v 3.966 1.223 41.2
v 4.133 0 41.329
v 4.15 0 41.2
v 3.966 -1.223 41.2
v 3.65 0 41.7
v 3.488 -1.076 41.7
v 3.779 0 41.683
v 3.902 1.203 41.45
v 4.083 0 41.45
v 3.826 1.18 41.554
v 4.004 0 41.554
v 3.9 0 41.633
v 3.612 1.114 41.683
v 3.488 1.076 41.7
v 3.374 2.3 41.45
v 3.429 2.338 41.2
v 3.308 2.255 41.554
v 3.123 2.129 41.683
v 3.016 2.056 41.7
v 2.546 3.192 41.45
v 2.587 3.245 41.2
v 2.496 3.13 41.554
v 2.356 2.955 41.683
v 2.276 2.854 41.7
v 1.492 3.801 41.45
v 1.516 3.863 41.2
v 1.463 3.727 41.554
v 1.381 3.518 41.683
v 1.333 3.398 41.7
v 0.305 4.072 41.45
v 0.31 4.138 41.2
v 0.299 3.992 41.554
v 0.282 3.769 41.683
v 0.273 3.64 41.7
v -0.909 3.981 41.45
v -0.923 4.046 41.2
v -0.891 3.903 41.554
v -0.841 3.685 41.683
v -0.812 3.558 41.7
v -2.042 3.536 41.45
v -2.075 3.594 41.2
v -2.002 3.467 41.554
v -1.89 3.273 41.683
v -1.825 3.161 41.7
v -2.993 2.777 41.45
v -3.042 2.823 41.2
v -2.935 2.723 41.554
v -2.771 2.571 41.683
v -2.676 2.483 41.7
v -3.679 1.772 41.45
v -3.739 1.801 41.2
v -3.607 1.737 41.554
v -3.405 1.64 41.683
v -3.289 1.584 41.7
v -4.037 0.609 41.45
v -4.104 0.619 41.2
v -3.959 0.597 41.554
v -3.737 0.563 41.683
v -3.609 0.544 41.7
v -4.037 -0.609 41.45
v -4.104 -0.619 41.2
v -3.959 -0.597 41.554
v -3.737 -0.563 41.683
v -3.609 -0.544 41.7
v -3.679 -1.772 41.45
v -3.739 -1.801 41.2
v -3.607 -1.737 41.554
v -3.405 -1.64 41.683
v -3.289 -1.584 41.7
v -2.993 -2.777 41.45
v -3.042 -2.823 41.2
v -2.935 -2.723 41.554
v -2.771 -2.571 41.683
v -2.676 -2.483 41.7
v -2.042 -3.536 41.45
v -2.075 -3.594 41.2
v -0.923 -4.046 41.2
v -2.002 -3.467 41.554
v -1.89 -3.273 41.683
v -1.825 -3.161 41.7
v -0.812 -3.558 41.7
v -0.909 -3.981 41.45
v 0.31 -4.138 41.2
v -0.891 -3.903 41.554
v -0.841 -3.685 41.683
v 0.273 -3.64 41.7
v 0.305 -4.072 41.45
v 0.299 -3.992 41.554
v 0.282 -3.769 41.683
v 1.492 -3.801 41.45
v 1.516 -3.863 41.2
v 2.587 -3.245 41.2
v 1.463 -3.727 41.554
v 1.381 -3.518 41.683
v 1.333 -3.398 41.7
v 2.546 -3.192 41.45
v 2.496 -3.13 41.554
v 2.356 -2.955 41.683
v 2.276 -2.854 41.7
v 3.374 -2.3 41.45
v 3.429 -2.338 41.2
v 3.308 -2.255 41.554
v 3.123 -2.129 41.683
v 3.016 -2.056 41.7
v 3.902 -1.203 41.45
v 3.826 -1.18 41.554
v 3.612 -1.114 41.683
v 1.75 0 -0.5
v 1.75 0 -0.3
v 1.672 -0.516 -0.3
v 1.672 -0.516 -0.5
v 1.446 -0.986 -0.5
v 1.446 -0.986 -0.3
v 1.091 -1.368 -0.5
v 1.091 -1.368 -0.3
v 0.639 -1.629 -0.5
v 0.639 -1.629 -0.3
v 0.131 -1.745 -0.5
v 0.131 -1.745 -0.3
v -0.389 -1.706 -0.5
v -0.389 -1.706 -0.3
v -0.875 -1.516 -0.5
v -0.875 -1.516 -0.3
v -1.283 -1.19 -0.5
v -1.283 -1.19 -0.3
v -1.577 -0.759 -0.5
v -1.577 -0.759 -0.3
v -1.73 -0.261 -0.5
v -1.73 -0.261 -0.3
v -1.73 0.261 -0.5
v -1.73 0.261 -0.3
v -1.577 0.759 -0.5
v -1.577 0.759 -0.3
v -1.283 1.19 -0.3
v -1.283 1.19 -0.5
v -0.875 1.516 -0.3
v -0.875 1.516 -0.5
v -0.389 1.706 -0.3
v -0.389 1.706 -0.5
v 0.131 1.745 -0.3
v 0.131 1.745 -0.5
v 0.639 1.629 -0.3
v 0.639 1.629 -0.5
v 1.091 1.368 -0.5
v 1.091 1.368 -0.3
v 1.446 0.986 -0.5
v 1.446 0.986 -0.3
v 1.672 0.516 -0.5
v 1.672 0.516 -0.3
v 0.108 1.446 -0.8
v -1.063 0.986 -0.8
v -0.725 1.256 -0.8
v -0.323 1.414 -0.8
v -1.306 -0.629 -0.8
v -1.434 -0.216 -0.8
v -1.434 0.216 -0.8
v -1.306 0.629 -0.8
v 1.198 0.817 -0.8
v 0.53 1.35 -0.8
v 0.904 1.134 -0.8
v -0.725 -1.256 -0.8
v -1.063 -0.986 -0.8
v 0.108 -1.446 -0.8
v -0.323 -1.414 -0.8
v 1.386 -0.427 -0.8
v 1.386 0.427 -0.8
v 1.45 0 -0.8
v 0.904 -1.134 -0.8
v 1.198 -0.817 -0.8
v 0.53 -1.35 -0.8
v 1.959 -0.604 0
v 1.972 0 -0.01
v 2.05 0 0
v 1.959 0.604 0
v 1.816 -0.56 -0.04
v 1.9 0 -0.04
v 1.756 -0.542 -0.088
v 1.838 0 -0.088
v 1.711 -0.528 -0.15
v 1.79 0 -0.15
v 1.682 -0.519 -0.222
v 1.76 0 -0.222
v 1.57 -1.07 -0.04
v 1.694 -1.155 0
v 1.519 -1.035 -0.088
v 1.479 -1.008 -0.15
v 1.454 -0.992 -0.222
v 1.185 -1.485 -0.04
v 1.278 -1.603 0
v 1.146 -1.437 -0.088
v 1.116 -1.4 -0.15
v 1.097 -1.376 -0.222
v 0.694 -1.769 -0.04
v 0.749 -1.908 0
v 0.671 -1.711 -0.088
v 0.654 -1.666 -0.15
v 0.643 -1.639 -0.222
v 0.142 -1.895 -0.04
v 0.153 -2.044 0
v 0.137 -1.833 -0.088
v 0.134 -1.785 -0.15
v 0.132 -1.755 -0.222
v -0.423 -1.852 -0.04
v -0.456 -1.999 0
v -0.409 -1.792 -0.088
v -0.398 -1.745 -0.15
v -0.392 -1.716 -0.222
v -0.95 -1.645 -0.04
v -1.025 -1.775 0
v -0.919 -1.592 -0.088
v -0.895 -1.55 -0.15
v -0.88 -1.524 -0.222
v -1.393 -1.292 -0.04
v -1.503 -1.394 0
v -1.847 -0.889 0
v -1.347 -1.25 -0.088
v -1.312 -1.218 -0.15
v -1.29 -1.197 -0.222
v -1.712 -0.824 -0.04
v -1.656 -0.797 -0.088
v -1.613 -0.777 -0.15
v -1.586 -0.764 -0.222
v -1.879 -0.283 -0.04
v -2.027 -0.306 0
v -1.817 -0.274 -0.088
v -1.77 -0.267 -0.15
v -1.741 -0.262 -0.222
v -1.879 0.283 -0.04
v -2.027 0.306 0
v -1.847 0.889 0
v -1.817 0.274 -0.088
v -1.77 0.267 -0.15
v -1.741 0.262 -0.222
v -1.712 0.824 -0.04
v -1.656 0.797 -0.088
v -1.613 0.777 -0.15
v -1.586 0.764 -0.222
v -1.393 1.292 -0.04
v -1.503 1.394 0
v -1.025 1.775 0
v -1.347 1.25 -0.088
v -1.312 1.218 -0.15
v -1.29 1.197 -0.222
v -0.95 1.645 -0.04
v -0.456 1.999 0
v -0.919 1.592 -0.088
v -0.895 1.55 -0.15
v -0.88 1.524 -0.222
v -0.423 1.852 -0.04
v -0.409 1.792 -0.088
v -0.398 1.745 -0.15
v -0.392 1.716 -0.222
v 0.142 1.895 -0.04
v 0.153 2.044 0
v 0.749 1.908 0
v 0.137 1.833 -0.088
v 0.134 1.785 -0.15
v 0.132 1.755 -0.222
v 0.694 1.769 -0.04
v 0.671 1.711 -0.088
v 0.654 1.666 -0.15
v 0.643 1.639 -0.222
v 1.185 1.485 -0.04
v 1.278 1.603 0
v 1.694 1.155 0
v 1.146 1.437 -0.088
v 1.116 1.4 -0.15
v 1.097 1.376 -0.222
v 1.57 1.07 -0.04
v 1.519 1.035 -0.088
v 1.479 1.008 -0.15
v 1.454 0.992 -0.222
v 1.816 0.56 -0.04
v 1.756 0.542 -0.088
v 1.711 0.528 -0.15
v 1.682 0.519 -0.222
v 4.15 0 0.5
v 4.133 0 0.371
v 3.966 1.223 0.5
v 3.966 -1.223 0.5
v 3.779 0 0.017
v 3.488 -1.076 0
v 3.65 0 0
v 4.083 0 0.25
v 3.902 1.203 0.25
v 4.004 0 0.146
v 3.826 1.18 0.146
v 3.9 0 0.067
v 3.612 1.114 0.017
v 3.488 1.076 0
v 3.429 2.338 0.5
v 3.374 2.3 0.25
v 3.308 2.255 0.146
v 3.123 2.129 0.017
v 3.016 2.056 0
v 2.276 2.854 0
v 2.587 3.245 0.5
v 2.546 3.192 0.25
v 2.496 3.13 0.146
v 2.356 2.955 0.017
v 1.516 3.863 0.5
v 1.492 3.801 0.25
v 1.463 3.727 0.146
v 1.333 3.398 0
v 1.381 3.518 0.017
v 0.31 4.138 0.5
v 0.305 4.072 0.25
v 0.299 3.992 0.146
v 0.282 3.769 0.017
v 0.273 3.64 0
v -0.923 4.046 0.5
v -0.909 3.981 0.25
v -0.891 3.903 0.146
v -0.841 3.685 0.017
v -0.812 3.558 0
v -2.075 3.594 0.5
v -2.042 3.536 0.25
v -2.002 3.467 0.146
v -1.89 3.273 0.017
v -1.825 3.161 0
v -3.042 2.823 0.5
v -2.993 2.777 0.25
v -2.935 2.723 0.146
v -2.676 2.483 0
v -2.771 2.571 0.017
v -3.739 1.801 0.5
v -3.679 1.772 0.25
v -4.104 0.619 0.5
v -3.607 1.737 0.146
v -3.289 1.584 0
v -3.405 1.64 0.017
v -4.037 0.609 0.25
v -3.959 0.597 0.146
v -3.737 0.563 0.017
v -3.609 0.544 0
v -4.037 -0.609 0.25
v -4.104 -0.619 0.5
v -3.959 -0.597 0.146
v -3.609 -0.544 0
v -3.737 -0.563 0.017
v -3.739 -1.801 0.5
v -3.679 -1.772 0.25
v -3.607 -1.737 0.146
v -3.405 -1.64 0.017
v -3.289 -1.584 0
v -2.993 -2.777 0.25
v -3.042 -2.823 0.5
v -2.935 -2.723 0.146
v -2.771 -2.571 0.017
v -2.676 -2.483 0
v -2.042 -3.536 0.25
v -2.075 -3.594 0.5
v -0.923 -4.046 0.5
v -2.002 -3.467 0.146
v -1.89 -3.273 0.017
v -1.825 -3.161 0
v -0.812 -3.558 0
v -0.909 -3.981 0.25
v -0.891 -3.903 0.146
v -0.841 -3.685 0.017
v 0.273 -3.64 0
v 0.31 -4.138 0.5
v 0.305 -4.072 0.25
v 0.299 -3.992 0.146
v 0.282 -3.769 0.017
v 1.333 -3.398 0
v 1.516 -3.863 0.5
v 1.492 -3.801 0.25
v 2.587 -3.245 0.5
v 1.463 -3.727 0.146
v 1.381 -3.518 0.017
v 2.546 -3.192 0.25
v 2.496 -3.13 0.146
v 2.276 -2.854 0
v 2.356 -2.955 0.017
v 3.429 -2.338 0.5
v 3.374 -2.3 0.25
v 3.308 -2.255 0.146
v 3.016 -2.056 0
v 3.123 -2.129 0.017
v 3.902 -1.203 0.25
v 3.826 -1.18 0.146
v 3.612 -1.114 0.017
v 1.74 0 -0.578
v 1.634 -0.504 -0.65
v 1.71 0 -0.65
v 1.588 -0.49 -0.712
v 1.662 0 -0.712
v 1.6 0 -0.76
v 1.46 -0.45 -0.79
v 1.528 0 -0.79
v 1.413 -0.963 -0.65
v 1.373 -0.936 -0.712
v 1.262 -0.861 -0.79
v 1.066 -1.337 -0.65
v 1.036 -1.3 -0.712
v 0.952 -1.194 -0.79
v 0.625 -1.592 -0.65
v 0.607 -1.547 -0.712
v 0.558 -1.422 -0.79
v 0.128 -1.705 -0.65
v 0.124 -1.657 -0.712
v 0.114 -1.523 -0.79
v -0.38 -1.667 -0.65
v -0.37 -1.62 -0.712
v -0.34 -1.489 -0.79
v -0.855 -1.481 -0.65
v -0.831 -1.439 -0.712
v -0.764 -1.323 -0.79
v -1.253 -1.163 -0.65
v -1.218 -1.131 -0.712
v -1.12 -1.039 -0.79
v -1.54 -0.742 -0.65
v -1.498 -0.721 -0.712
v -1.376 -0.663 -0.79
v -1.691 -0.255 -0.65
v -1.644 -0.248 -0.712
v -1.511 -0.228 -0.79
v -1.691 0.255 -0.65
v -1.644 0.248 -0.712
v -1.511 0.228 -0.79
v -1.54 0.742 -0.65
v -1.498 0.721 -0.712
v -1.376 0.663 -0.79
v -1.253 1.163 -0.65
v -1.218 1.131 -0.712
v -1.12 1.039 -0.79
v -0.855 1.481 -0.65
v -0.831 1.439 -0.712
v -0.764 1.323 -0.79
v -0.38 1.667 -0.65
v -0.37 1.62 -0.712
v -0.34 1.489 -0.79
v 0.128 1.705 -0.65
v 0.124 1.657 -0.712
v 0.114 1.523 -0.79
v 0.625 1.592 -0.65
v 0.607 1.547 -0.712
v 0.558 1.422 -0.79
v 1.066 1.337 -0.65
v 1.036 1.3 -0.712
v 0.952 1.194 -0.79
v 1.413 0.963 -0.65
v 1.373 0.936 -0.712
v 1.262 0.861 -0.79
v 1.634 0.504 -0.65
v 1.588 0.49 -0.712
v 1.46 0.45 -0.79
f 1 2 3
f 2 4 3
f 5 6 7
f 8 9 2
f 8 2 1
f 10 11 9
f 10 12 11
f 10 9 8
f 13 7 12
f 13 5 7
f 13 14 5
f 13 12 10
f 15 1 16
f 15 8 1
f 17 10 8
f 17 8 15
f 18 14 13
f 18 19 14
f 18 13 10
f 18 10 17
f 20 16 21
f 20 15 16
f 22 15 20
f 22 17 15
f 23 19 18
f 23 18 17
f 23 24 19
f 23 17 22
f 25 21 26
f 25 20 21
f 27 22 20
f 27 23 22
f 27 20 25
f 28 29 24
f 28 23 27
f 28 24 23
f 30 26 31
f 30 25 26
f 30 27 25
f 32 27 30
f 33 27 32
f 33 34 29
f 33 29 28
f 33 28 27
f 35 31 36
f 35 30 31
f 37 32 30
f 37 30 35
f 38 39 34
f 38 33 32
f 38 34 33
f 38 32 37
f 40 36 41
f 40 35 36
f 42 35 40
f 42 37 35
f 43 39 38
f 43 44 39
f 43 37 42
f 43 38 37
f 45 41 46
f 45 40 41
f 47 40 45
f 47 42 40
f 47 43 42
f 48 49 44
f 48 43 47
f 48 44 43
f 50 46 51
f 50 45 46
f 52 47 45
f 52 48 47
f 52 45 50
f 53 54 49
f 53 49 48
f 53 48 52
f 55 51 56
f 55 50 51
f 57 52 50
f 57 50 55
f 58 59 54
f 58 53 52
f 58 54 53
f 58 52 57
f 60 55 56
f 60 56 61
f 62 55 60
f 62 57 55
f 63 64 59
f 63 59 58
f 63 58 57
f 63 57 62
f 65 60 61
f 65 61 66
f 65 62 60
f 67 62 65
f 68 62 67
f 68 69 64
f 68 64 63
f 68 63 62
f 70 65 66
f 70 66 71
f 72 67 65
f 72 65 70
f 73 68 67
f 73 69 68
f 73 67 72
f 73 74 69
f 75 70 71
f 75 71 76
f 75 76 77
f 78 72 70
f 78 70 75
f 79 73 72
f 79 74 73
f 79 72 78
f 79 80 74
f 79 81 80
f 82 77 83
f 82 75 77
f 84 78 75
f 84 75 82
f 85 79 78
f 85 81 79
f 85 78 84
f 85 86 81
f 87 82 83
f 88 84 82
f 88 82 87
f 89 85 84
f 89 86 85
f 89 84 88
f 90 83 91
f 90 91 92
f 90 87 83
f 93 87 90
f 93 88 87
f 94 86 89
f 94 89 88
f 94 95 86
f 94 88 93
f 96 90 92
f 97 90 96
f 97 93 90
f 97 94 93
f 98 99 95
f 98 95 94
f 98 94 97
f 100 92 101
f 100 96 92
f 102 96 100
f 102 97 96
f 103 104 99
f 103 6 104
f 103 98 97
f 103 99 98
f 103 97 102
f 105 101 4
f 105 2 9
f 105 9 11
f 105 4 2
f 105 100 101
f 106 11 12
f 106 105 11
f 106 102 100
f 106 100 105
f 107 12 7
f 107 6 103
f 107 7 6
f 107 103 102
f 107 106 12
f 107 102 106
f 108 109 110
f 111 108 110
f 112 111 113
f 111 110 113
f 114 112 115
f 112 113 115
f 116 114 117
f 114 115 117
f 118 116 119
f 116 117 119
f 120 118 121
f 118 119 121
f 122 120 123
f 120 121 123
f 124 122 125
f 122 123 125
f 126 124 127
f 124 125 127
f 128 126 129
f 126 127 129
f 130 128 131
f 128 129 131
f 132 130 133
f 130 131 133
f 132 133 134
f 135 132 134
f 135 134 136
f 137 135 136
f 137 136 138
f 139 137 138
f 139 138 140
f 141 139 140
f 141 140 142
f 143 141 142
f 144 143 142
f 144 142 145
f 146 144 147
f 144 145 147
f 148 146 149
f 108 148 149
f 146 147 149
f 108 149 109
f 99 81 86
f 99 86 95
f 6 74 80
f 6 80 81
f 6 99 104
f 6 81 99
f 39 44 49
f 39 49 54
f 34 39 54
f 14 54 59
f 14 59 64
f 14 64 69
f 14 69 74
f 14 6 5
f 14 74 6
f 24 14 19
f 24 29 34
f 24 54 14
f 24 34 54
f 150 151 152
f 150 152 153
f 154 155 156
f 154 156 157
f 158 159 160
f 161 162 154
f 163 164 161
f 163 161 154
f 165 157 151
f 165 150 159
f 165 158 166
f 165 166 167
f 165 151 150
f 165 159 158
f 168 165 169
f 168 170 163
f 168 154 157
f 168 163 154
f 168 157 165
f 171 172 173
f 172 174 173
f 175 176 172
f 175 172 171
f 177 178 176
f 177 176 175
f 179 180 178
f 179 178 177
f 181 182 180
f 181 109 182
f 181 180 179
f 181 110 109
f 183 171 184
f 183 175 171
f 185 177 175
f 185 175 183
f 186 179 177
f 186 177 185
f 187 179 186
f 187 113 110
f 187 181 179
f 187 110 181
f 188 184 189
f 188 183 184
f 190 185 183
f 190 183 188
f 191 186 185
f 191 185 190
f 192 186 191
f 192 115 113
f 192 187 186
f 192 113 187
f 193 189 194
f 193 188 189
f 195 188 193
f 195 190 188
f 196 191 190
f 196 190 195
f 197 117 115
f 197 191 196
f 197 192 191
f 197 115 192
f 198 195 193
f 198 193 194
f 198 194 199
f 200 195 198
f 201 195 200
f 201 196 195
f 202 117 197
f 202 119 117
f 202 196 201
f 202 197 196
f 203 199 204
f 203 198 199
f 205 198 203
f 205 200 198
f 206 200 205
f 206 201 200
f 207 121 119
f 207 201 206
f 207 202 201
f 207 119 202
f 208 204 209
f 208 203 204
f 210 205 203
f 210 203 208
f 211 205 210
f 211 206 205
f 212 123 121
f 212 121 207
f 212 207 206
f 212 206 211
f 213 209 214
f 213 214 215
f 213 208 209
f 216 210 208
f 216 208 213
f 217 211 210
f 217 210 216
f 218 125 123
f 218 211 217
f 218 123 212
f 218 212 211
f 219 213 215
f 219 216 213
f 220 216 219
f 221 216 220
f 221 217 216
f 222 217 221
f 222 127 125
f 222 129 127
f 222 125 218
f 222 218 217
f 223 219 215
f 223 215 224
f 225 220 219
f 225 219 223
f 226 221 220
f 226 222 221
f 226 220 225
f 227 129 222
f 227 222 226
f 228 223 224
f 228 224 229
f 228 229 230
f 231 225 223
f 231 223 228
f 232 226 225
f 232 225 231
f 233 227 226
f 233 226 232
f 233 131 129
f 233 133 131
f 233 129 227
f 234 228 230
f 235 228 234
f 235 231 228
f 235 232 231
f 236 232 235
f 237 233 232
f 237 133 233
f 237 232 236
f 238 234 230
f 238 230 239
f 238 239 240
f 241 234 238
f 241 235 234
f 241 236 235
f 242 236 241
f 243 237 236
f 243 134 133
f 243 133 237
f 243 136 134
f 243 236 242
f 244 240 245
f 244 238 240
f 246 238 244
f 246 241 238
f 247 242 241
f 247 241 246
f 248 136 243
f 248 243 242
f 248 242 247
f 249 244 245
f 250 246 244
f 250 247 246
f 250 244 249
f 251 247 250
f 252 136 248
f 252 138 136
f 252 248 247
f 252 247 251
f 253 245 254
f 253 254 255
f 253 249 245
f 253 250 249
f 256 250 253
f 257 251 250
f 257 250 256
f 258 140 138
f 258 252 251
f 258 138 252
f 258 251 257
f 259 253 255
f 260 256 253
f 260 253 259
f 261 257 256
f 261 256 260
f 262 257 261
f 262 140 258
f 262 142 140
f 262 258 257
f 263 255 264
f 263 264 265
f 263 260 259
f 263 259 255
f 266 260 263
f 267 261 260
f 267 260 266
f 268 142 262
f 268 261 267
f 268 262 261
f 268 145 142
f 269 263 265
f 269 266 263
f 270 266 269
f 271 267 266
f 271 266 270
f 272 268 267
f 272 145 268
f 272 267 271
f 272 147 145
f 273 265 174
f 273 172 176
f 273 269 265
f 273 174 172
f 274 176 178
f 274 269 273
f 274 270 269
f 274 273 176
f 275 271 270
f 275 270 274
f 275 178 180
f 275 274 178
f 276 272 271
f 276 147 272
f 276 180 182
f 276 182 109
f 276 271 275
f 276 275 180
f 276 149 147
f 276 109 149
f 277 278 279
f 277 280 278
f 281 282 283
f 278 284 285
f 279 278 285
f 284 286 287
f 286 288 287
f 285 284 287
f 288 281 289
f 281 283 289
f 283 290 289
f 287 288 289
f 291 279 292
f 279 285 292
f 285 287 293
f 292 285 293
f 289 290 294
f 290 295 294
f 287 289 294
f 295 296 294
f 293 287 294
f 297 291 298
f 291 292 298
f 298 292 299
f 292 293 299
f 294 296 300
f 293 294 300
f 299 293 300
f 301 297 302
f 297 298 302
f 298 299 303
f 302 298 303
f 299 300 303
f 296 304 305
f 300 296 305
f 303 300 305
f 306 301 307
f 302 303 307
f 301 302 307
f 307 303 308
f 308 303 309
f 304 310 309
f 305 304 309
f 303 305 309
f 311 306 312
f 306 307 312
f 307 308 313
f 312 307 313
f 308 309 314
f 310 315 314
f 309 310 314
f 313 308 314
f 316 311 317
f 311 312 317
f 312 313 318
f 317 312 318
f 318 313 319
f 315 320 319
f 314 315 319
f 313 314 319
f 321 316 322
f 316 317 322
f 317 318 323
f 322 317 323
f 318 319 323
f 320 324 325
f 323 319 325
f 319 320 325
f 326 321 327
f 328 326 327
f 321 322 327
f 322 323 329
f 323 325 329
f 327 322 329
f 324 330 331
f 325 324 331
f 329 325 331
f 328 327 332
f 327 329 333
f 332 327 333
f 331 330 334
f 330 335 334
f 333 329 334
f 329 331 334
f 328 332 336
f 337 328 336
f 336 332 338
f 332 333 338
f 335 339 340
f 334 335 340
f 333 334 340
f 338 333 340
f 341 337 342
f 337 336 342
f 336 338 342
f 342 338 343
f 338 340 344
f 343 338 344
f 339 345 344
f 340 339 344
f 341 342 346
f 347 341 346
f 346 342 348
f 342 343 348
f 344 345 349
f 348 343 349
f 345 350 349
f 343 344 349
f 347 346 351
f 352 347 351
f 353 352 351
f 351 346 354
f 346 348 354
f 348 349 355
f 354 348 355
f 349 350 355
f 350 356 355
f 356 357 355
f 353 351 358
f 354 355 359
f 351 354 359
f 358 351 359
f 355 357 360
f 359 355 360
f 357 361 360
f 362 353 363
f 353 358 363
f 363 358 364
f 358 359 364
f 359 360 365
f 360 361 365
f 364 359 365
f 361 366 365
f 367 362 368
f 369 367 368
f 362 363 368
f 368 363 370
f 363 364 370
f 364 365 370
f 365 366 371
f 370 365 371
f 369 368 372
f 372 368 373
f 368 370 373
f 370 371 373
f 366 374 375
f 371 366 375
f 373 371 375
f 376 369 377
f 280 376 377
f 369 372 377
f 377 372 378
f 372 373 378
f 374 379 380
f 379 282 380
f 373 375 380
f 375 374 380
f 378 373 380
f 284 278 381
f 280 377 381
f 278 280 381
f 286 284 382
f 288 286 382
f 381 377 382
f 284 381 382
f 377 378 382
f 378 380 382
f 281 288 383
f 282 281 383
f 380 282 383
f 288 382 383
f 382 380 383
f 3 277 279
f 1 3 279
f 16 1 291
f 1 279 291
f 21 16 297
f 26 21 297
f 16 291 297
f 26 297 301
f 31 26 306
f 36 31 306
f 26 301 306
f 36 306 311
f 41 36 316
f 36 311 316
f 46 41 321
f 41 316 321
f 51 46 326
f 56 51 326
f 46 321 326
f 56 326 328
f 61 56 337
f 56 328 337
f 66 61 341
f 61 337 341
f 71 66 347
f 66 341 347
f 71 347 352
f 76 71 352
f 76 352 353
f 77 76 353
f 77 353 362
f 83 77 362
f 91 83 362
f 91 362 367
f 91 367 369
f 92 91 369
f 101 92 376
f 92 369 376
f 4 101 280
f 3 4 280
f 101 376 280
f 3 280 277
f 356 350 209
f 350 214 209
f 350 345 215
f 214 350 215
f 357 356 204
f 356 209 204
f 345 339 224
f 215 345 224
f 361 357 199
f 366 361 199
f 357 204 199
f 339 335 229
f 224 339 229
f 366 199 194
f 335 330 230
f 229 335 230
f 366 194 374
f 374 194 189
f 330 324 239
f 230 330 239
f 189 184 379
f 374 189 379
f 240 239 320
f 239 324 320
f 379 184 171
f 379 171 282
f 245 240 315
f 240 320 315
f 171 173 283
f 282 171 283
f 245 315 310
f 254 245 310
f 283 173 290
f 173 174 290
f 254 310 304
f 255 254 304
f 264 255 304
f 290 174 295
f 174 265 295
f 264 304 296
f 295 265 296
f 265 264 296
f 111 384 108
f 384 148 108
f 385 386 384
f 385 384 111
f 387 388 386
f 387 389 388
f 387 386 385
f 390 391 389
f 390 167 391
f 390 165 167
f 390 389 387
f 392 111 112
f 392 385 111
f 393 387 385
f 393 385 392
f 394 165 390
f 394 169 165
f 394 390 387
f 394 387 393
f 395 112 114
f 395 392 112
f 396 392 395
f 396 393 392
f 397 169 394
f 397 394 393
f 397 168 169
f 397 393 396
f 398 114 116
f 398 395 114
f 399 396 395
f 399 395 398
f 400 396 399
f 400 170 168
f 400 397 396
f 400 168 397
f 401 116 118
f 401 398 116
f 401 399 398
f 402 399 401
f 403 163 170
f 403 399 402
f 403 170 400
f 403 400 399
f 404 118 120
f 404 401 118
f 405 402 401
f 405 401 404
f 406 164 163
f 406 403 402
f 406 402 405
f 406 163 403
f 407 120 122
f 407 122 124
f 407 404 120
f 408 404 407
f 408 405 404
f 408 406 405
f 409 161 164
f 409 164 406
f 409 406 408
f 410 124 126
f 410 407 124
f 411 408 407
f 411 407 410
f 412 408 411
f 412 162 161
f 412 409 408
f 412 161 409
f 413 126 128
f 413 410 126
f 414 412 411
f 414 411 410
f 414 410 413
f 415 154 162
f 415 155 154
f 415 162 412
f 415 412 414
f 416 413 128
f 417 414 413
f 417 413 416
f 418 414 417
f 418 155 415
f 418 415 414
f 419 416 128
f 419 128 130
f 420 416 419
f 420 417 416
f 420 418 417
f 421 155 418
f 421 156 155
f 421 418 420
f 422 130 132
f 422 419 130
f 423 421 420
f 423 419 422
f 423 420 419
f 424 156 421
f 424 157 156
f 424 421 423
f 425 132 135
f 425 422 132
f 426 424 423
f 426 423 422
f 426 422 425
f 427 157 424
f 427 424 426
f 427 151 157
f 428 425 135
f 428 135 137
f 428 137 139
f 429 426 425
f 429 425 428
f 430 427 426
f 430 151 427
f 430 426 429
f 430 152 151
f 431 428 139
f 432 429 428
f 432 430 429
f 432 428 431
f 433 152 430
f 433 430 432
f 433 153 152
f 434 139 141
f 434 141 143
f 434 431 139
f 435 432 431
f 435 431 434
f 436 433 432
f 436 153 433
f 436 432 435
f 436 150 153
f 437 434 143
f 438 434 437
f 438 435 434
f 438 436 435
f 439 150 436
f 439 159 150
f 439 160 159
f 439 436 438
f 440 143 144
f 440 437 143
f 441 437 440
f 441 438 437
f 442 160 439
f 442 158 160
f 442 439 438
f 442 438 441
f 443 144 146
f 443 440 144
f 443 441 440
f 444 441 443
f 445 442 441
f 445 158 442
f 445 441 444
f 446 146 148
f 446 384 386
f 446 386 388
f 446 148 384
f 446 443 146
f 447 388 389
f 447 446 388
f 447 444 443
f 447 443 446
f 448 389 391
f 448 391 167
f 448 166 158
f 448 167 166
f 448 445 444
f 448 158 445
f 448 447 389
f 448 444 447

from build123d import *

# Parameters (mm, degrees)
F0_R     = 4.15
F1_DEPTH = 41.7
F2_R     = 1.75
F3_DEPTH = 0.8
F4_R     = 0.5
F5_R     = 0.5
F6_R     = 0.3


with BuildPart() as f1:
    # F0 (on Top) → F1 (new body)
    with BuildSketch(Plane.XY):
        Circle(F0_R)
    extrude(amount=F1_DEPTH)

    # F2 (on face) → F3 (join)
    with BuildSketch(Plane(origin=(0, 0, 0), x_dir=(1, 0, 0), z_dir=(0, 0, -1))):
        Circle(F2_R)
    extrude(amount=F3_DEPTH)

    # F4
    f4_edges = [f1.edges().sort_by_distance(p)[0] for p in [
        (-4.15, 0, 0),
    ]]
    fillet(f4_edges, radius=F4_R)

    # F5
    f5_edges = [f1.edges().sort_by_distance(p)[0] for p in [
        (-4.15, 0, 41.7),
    ]]
    fillet(f5_edges, radius=F5_R)

    # F6
    f6_edges = [f1.edges().sort_by_distance(p)[0] for p in [
        (-1.75, 0, -0.8),
        (-1.75, 0, 0),
    ]]
    fillet(f6_edges, radius=F6_R)


solid = f1.part
